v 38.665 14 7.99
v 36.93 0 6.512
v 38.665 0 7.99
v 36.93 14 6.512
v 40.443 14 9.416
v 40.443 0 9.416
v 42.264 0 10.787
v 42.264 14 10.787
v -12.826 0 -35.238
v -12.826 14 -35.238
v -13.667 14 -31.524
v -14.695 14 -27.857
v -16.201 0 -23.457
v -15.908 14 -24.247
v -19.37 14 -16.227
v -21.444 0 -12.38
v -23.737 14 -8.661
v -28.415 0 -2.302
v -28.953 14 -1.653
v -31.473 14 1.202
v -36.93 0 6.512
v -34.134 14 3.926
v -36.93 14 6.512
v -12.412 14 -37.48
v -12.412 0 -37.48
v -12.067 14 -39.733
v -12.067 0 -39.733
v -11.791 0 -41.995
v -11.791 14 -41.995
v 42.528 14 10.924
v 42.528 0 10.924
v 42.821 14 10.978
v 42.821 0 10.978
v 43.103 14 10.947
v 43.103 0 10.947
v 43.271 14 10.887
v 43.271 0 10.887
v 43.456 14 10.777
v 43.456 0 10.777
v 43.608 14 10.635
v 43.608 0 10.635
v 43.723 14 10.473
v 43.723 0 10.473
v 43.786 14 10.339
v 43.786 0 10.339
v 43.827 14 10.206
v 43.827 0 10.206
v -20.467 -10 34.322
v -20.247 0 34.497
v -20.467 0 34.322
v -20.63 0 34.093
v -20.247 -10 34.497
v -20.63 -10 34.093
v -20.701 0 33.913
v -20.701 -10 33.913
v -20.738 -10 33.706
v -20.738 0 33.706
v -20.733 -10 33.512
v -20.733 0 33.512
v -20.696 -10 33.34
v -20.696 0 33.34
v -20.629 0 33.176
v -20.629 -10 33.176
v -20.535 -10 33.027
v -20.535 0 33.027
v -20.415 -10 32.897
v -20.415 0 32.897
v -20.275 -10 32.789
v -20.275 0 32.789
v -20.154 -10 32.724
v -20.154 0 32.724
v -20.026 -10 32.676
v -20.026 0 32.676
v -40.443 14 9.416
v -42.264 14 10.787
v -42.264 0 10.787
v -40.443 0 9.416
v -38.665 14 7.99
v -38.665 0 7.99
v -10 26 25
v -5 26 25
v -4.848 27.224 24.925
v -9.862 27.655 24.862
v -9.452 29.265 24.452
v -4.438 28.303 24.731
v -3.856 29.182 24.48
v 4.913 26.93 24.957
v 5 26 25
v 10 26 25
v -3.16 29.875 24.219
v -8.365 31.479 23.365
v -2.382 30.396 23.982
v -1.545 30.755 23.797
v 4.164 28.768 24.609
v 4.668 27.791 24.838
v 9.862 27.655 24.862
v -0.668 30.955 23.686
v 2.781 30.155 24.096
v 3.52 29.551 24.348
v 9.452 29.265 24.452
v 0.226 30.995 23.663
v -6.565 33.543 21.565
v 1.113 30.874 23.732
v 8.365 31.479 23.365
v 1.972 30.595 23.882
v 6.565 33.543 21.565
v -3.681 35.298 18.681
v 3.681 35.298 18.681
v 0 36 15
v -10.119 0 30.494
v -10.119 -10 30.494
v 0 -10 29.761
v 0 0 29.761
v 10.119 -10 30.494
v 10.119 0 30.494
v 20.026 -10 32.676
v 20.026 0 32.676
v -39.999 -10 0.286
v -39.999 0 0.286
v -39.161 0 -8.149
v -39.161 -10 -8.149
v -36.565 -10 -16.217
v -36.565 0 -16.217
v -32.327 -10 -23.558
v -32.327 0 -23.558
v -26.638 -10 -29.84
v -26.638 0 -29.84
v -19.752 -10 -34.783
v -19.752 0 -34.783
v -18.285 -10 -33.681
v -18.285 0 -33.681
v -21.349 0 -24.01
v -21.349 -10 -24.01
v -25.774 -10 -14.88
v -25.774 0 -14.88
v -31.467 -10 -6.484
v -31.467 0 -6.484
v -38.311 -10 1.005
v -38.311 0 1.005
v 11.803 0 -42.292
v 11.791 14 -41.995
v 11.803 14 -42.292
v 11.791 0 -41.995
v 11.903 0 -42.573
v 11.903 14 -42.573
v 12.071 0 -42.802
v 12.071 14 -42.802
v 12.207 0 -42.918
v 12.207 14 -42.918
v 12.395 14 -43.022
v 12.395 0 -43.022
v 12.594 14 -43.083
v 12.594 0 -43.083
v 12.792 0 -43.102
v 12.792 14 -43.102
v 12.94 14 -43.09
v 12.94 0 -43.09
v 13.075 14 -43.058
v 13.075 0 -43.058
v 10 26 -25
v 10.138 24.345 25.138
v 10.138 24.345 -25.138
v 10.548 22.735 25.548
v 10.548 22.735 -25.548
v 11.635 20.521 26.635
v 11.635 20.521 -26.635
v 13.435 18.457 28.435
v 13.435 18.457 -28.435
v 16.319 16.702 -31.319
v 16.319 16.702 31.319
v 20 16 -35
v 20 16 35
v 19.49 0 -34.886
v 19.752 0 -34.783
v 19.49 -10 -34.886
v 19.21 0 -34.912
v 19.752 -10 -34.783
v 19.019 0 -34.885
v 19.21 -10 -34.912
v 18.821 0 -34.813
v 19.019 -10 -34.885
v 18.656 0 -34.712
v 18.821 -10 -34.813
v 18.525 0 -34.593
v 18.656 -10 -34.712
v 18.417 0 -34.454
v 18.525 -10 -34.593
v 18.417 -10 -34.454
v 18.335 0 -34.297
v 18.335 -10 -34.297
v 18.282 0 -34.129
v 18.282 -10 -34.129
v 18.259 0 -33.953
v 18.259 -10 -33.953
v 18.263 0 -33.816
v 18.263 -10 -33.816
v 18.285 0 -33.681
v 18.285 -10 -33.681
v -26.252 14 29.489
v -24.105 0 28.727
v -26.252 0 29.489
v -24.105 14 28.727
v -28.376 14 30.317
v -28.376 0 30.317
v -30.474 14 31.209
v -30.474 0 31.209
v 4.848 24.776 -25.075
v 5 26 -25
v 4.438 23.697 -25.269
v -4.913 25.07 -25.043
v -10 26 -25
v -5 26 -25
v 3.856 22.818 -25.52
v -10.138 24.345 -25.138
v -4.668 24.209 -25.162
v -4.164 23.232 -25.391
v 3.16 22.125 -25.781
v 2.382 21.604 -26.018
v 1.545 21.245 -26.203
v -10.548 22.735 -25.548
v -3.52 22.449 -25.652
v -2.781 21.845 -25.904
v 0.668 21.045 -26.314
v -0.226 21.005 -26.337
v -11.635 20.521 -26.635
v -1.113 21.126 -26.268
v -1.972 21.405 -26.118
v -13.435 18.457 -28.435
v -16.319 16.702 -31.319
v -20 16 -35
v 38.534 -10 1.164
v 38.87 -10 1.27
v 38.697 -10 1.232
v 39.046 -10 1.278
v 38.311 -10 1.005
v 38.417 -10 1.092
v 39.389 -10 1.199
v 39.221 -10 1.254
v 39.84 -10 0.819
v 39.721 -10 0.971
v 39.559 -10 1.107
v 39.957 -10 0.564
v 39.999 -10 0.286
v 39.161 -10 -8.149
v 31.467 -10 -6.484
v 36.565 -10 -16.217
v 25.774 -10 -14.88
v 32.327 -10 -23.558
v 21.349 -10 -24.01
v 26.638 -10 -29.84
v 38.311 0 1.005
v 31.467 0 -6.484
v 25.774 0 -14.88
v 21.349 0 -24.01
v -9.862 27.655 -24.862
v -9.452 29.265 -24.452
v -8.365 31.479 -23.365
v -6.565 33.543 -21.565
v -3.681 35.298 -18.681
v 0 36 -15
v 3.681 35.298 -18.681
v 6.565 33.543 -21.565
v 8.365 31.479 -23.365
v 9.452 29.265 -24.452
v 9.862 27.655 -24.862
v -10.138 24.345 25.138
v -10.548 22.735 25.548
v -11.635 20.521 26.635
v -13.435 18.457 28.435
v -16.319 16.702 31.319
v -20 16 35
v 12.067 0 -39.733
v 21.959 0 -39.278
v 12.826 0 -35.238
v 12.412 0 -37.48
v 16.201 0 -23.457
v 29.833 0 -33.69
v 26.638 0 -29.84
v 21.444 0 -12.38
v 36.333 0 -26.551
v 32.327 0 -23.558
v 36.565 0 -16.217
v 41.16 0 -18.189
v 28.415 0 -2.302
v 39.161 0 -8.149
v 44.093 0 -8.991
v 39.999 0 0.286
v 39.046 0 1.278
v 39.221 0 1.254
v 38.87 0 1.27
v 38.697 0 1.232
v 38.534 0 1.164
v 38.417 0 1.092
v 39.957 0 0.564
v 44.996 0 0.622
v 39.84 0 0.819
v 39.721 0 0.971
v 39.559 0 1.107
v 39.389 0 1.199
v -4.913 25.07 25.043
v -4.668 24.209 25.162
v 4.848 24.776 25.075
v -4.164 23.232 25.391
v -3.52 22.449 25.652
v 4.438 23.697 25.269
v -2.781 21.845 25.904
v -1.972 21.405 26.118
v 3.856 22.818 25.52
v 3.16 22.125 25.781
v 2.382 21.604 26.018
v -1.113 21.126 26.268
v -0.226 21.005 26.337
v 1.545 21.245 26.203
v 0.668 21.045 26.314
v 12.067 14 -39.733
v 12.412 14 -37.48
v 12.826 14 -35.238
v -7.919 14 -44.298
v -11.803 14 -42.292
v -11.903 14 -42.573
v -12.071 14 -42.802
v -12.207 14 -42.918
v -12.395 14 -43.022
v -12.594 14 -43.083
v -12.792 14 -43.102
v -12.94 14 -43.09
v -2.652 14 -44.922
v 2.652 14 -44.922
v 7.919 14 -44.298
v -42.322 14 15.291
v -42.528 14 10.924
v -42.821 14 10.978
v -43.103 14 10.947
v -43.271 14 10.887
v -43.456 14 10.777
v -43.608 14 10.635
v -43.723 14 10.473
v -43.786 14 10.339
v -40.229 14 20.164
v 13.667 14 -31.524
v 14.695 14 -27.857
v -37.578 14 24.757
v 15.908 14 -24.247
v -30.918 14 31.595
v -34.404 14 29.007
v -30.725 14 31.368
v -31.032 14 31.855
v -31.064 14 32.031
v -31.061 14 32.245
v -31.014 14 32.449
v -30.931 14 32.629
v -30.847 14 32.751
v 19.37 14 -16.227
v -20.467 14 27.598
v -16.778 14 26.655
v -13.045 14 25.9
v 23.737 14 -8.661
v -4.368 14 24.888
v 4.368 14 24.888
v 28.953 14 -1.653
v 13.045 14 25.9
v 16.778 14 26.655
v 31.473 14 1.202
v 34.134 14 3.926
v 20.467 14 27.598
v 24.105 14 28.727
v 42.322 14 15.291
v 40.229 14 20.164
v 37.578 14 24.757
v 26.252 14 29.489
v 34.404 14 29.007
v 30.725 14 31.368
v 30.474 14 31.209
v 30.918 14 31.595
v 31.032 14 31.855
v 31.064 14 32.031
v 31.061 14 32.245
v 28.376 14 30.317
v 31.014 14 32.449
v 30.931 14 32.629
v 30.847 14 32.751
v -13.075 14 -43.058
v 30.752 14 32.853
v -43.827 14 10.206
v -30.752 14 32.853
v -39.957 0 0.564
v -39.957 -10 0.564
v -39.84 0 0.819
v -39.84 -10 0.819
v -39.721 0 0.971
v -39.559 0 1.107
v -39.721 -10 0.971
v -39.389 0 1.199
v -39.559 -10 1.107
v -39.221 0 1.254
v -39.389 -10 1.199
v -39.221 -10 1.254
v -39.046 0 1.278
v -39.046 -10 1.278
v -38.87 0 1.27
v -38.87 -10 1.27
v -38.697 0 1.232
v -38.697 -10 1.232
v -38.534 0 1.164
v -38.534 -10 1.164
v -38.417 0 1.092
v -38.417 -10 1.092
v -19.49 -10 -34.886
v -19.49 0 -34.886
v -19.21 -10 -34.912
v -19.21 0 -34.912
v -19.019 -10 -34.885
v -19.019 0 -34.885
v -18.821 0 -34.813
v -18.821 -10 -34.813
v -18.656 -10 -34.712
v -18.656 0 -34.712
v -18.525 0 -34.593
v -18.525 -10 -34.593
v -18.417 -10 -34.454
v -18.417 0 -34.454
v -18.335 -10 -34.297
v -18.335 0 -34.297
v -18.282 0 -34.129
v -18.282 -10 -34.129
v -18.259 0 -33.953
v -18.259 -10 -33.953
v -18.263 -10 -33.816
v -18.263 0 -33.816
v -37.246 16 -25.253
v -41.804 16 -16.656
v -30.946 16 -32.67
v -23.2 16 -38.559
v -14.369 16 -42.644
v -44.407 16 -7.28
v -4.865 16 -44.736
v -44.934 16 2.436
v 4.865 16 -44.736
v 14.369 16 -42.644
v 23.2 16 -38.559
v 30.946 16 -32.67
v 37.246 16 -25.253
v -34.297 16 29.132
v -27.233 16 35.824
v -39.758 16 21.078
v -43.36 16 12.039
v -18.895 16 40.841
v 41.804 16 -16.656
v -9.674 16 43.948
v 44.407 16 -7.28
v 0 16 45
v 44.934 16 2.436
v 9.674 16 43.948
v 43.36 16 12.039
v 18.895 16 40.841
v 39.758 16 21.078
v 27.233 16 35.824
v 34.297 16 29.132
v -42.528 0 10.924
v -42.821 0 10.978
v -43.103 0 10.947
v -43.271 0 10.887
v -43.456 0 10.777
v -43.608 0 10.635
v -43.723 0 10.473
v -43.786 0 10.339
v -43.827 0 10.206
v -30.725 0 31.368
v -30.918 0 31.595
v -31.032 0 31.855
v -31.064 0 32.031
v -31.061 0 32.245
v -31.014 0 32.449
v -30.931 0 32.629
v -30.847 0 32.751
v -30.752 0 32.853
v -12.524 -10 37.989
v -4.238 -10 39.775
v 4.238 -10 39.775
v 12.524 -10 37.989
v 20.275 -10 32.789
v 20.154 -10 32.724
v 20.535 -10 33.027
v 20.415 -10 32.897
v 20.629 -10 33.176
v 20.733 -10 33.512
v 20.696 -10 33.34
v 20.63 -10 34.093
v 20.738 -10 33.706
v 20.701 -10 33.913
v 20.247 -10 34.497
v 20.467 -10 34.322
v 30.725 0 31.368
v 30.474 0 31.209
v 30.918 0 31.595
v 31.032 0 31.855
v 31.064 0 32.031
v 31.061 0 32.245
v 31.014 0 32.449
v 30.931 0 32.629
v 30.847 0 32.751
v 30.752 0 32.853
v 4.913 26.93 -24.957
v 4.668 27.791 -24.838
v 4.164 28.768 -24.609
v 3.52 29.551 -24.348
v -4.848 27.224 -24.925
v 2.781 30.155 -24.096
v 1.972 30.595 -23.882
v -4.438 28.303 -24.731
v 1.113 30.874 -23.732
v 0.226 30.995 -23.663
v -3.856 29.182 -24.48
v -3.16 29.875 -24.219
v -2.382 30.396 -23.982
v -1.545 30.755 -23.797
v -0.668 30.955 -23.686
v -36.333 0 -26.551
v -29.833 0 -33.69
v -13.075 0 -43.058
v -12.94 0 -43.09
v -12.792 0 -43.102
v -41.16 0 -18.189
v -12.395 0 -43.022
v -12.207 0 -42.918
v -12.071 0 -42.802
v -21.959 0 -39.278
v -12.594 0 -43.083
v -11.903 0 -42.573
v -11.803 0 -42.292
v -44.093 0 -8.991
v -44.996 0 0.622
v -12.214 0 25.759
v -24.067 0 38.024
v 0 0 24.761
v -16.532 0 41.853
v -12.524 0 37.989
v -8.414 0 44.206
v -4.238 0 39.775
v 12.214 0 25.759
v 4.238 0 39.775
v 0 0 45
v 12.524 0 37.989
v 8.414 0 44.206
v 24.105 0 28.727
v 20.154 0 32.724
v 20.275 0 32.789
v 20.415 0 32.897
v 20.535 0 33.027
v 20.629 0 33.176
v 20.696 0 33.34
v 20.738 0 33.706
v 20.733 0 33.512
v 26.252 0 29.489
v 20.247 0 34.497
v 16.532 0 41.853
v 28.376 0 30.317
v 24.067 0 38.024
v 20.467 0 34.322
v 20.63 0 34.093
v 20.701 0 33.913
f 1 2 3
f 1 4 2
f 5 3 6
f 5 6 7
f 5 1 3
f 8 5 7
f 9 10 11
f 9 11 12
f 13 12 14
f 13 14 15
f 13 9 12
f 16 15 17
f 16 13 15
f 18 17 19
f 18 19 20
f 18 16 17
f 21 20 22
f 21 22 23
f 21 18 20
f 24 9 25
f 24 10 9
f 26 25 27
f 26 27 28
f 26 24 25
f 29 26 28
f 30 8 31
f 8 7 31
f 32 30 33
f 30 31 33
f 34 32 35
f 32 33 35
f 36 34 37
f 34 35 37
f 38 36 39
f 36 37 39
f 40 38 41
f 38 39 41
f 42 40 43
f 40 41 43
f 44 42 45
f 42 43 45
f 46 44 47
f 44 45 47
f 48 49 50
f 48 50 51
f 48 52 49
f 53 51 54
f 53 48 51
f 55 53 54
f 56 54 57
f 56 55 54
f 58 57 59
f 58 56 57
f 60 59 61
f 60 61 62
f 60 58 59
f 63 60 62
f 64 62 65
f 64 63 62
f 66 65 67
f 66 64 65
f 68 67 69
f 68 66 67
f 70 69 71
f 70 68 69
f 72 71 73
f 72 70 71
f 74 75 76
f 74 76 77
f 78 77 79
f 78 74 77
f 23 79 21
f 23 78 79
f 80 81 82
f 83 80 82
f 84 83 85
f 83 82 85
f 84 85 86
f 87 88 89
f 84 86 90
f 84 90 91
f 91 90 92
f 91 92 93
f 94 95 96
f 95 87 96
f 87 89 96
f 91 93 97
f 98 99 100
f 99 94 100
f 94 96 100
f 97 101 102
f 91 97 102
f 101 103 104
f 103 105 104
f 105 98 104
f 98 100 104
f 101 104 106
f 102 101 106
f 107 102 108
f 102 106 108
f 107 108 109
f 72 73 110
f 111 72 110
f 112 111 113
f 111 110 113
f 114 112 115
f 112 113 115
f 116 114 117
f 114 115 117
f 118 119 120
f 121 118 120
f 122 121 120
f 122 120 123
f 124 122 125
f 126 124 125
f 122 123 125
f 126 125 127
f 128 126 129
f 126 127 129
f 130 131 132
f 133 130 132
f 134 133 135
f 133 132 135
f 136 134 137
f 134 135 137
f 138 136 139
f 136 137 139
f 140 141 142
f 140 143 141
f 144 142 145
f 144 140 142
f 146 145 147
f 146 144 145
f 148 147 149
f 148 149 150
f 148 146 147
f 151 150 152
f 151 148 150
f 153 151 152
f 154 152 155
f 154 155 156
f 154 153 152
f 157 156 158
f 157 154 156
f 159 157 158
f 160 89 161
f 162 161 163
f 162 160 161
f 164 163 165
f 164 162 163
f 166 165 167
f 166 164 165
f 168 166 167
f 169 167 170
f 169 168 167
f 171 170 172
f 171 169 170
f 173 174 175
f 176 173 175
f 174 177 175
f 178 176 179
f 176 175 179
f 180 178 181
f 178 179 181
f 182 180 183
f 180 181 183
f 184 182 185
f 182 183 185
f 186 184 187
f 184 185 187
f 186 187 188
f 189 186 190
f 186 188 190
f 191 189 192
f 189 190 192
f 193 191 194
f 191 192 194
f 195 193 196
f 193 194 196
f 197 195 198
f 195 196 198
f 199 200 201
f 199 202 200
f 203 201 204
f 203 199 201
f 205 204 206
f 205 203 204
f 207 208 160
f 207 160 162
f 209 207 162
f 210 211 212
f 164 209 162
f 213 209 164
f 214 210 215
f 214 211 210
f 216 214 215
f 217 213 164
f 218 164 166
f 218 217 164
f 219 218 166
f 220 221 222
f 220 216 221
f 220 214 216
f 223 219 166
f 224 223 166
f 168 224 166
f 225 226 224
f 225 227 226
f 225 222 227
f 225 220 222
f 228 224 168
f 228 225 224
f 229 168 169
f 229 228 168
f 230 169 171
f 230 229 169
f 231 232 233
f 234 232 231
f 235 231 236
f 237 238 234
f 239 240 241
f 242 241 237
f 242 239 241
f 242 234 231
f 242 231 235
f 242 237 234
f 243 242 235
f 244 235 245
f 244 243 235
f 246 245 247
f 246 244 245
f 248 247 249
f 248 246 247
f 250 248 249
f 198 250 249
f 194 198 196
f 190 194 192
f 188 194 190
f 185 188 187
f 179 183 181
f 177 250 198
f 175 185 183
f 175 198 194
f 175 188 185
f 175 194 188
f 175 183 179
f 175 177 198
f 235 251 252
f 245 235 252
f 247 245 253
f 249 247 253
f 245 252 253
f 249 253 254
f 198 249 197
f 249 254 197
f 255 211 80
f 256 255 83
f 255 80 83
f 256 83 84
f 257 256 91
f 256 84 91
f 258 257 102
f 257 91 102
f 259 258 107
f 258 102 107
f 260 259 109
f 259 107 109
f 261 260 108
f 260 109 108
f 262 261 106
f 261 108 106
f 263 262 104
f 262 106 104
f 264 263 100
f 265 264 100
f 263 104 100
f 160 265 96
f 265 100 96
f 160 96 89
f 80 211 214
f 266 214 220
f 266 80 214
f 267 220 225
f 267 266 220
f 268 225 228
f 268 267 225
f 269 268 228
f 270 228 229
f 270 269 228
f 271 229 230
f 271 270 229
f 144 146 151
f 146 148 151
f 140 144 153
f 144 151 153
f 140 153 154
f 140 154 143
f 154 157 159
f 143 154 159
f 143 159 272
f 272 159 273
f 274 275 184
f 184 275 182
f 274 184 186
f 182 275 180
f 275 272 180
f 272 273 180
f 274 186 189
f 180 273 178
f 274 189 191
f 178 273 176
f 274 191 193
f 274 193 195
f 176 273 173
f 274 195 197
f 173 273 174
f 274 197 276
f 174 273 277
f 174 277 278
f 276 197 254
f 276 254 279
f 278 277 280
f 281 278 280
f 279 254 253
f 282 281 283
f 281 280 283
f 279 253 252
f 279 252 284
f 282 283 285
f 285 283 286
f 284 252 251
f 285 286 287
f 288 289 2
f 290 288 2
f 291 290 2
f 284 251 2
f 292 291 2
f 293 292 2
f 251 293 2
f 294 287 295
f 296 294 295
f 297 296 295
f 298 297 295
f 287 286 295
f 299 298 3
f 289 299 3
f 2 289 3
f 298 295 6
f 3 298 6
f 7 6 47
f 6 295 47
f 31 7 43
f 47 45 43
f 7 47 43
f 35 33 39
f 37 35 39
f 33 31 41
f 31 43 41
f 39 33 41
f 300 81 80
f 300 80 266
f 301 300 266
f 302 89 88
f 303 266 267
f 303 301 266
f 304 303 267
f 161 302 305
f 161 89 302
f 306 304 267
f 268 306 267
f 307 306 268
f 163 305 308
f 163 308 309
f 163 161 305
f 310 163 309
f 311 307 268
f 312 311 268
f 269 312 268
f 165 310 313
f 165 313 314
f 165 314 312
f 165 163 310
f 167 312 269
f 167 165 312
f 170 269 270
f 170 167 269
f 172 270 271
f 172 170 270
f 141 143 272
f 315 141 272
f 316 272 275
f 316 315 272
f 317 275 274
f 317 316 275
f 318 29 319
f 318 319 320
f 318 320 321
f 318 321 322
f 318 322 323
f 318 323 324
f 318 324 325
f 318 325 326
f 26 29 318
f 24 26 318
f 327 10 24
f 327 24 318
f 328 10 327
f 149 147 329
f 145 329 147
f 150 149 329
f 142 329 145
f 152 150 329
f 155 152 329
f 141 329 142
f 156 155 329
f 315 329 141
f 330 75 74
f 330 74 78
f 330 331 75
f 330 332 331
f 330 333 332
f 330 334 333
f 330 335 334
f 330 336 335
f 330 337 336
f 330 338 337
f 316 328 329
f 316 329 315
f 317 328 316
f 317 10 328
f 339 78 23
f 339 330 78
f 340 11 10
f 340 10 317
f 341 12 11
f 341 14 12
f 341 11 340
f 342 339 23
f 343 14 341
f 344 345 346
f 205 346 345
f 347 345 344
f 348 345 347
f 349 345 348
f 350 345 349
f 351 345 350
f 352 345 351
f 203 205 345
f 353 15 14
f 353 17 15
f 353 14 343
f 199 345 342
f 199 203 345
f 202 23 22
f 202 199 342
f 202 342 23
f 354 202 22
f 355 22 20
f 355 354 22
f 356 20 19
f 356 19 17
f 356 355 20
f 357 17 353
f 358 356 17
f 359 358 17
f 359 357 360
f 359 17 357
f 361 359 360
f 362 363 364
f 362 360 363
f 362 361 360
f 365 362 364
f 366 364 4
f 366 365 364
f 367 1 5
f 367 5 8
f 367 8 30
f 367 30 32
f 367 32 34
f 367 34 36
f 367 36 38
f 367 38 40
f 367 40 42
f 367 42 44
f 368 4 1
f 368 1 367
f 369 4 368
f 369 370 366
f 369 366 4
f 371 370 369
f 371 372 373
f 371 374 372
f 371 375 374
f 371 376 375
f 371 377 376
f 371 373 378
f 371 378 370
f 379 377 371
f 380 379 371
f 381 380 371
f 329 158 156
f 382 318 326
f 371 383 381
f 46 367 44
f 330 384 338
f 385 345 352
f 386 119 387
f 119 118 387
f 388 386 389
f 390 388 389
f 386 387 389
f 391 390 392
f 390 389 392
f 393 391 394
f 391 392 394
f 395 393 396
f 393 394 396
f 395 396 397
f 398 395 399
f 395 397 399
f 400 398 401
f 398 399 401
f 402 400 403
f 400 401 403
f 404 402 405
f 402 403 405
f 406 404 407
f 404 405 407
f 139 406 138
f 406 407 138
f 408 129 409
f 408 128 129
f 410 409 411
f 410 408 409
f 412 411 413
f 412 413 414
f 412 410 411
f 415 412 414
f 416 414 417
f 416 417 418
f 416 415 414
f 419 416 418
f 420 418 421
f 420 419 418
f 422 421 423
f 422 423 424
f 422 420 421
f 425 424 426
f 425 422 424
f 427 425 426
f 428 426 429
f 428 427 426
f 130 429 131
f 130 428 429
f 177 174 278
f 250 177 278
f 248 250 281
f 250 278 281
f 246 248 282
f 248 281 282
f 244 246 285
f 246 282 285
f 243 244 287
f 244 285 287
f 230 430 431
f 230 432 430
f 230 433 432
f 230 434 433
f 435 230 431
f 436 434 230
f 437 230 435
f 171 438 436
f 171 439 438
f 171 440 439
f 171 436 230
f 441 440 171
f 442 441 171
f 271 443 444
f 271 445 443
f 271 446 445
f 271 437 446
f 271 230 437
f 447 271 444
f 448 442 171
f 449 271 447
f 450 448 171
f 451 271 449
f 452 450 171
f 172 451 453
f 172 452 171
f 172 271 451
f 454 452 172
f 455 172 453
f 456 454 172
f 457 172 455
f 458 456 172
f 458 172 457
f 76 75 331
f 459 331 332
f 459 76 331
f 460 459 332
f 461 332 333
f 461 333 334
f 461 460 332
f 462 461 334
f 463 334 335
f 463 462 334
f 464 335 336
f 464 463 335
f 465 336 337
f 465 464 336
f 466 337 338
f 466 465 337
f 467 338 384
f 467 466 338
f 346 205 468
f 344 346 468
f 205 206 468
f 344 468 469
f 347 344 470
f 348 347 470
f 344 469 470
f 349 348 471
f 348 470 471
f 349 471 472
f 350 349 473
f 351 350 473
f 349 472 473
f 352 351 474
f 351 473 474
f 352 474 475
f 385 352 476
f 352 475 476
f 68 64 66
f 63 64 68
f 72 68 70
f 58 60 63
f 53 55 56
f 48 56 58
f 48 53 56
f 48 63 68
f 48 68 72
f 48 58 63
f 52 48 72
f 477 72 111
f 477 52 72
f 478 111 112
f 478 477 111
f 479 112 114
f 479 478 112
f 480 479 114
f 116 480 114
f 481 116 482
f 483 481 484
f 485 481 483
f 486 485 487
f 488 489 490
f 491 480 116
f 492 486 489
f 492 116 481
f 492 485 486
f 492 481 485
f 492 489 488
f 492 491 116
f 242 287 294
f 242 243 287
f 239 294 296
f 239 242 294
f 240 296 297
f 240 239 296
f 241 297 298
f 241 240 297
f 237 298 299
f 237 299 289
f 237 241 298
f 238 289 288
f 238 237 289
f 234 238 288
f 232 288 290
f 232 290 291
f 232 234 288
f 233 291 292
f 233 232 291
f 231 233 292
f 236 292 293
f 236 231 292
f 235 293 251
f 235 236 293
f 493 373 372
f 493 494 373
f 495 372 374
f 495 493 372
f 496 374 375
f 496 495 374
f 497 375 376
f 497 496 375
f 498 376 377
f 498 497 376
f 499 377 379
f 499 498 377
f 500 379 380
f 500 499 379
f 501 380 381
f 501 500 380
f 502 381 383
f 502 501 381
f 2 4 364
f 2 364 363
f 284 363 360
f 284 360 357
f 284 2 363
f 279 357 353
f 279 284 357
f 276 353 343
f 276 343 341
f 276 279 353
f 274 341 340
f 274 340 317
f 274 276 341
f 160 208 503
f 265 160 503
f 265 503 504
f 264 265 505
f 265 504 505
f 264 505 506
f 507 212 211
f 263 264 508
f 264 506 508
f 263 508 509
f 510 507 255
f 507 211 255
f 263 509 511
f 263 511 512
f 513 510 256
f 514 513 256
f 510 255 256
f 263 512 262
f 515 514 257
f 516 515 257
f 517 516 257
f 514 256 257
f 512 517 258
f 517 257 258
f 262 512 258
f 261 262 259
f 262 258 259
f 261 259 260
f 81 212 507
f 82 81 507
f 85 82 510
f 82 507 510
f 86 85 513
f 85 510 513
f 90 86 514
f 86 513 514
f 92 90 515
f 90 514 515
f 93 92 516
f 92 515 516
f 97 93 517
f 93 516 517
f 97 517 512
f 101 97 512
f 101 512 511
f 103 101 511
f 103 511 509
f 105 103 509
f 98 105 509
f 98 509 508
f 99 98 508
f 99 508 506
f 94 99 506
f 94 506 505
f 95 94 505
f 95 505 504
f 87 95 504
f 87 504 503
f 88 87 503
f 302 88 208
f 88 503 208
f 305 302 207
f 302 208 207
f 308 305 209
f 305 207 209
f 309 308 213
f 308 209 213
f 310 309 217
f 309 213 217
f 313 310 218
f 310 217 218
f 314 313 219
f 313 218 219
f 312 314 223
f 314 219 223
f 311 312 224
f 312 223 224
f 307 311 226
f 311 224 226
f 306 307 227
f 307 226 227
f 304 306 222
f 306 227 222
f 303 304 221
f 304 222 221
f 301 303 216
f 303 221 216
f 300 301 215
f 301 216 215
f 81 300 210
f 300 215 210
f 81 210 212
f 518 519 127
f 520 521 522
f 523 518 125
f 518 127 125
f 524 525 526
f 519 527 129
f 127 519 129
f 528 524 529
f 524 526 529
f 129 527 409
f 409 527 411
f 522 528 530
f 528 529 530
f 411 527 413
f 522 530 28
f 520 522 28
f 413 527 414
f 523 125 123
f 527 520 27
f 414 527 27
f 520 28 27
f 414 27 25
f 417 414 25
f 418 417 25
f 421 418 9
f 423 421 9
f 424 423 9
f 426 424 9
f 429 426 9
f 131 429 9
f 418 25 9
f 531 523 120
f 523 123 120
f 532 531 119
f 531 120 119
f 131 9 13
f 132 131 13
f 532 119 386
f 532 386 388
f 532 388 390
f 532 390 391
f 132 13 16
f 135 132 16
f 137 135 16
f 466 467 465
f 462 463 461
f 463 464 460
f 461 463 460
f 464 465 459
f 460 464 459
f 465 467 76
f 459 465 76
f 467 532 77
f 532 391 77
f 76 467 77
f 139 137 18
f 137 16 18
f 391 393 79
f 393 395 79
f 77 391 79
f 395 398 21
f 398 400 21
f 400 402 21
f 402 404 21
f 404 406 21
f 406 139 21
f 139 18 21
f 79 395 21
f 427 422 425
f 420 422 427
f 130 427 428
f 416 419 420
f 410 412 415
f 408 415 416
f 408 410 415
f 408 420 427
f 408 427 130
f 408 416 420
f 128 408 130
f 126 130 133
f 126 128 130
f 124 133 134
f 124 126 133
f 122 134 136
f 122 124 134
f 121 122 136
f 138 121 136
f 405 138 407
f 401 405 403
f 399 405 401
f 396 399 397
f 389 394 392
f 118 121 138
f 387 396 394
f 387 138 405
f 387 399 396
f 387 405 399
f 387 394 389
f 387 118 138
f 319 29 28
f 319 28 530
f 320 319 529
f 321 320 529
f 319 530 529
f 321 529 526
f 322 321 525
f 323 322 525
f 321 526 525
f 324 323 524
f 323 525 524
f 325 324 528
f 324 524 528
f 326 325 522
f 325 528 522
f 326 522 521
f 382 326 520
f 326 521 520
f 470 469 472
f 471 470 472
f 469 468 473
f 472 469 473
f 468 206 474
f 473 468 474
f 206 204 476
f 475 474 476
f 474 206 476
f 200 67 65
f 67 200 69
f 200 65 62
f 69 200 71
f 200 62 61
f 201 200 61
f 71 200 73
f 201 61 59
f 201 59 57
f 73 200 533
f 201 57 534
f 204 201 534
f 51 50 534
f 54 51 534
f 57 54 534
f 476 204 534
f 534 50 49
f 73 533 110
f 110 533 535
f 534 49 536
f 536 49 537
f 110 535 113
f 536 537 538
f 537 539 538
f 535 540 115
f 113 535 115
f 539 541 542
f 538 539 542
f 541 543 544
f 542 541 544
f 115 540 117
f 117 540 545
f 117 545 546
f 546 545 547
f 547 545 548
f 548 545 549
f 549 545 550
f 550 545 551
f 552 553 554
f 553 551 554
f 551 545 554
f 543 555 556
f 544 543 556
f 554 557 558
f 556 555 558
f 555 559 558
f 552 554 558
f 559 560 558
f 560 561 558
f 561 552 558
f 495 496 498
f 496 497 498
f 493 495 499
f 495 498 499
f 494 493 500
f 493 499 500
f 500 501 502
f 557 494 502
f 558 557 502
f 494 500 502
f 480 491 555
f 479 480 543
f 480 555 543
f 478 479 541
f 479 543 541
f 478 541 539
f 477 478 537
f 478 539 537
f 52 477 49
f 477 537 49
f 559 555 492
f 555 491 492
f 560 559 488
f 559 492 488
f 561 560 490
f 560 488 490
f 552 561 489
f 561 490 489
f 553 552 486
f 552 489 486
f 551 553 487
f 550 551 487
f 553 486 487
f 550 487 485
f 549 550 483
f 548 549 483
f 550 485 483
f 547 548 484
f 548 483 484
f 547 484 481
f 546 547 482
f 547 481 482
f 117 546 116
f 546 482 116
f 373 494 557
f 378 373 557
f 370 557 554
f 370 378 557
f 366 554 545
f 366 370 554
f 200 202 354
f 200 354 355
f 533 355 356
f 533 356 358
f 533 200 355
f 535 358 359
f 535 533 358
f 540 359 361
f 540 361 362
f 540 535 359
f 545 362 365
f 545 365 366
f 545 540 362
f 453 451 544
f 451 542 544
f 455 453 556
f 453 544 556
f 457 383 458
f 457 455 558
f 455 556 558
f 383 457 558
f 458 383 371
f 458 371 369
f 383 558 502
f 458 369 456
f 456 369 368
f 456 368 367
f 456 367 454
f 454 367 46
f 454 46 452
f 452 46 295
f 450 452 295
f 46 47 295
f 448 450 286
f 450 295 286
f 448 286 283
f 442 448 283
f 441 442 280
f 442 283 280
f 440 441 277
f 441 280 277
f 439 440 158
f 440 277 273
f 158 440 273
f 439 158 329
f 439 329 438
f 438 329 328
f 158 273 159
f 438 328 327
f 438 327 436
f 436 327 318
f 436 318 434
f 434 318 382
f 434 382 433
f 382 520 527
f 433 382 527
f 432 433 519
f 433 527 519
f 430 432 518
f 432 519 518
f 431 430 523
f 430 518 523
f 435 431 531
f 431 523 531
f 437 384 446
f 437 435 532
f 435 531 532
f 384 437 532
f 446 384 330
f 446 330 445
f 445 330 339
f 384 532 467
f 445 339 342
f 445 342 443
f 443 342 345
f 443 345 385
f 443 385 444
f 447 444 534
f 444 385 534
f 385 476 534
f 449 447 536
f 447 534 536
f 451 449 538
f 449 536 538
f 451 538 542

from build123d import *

# Parameters (mm, degrees)
SKETCH1_R                = 37.5
BOSS_EXTRUDE1_DEPTH      = 14
CUT_EXTRUDE2_START       = -14
CUT_EXTRUDE2_DEPTH       = 14
SKETCH4_R                = 45
SKETCH4_R_2              = 37.5
BOSS_EXTRUDE2_DEPTH      = 14
SKETCH6_R                = 45
BOSS_EXTRUDE3_DEPTH      = 2
SKETCH7_R                = 1.75
CUT_EXTRUDE3_DEPTH       = 66.620118866
CIRPATTERN2_COUNT        = 3
BOSS_EXTRUDE4_DEPTH      = 10
FILLET1_R                = 1
CIRPATTERN3_COUNT        = 3
FILLET1_OF_CIRPATTERN3_R = 1
CUT_EXTRUDE4_DEPTH       = 69.01470446
FILLET2_R                = 1
SKETCH15_R               = 45
BOSS_EXTRUDE5_DEPTH      = 2
SKETCH16_W               = 20
SKETCH16_H               = 50
BOSS_EXTRUDE6_DEPTH      = 20
SKETCH17_R               = 5
CUT_EXTRUDE5_DEPTH       = 91.669730467
FILLET3_R                = 10


# Read off the part's stored shape, not the designer's step: Cut-Extrude2
with BuildPart() as part:
    # Sketch1 → Boss-Extrude1 (new body)
    with BuildSketch(Plane(origin=(0, 0, 0), x_dir=(1, 0, 0), z_dir=(0, 1, 0))):
        with Locations(Location((0, 0, 0), (0, 0, 270))):
            Circle(SKETCH1_R)
    extrude(amount=BOSS_EXTRUDE1_DEPTH)

    # Cut-Extrude2 outline → Cut-Extrude2 (cut)
    with BuildSketch(Plane(origin=(0, 14, 0), x_dir=(1, 0, 0), z_dir=(0, 1, 0)).offset(CUT_EXTRUDE2_START)):
        with BuildLine():
            ThreePointArc((-24.104535363, -28.726666617), (0, -24.760936498), (24.104535363, -28.726666617))
            ThreePointArc((24.104535363, -28.726666617), (32.475952642, -18.75), (36.930290738, -6.511806663))
            ThreePointArc((36.930290738, -6.511806663), (21.443600029, 12.380468249), (12.825755375, 35.238473279))
            ThreePointArc((12.825755375, 35.238473279), (0, 37.5), (-12.825755375, 35.238473279))
            ThreePointArc((-12.825755375, 35.238473279), (-21.443600029, 12.380468249), (-36.930290738, -6.511806663))
            ThreePointArc((-36.930290738, -6.511806663), (-32.475952642, -18.75), (-24.104535363, -28.726666617))
        make_face()
    extrude(amount=CUT_EXTRUDE2_DEPTH, mode=Mode.SUBTRACT)

    # Sketch4 → Boss-Extrude2 (add)
    with BuildSketch(Plane(origin=(0, 0, 0), x_dir=(1, 0, 0), z_dir=(0, 1, 0))):
        with Locations(Location((0, 0, 0), (0, 0, 270))):
            Circle(SKETCH4_R)
        Circle(SKETCH4_R_2, mode=Mode.SUBTRACT)
    extrude(amount=BOSS_EXTRUDE2_DEPTH)

    # Sketch6 → Boss-Extrude3 (add)
    with BuildSketch(Plane(origin=(0, 14, 0), x_dir=(1, 0, 0), z_dir=(0, 1, 0))):
        with Locations(Location((0, 0, 0), (0, 0, 270))):
            Circle(SKETCH6_R)
        with BuildLine():
            ThreePointArc((-28.952849653, 1.653026611), (-25.11473671, -14.5), (-13.044861788, -25.900416617))
            ThreePointArc((-13.044861788, -25.900416617), (0, -24.760936498), (13.044861788, -25.900416617))
            ThreePointArc((13.044861788, -25.900416617), (25.11473671, -14.5), (28.952849653, 1.653026611))
            ThreePointArc((28.952849653, 1.653026611), (21.443600029, 12.380468249), (15.907987865, 24.247390006))
            ThreePointArc((15.907987865, 24.247390006), (0, 29), (-15.907987865, 24.247390006))
            ThreePointArc((-15.907987865, 24.247390006), (-21.443600029, 12.380468249), (-28.952849653, 1.653026611))
        make_face(mode=Mode.SUBTRACT)
    extrude(amount=BOSS_EXTRUDE3_DEPTH)

    # Sketch7 → Cut-Extrude3 (cut, through all)
    with BuildSketch(Plane(origin=(0, 16, 0), x_dir=(1, 0, 0), z_dir=(0, 1, 0))):
        with Locations(Location((0, 32, 0), (0, 0, 270))):
            Circle(SKETCH7_R)
    cut_extrude3 = extrude(amount=-CUT_EXTRUDE3_DEPTH, mode=Mode.SUBTRACT)

    # CirPattern2: Cut-Extrude3 ×3 about axis
    cirpattern2_axis = Axis((0, 0, 0), (0, 1, 0))
    for i in range(1, CIRPATTERN2_COUNT):
        add(cut_extrude3.rotate(cirpattern2_axis, i * 360 / CIRPATTERN2_COUNT), mode=Mode.SUBTRACT)

    # Sketch13 → Boss-Extrude4 (add)
    with BuildSketch(Plane.XZ):
        with BuildLine():
            ThreePointArc((-22.11228446, 33.332369792), (0, 29.760936498), (22.11228446, 33.332369792))
            ThreePointArc((22.11228446, 33.332369792), (0, 40), (-22.11228446, 33.332369792))
        make_face()
    boss_extrude4 = extrude(amount=BOSS_EXTRUDE4_DEPTH)

    # Fillet1
    fillet1_edges = [part.edges().sort_by_distance(p)[0] for p in [
        (22.11228446, -5, 33.332369792),
        (-22.11228446, -5, 33.332369792),
    ]]
    fillet(fillet1_edges, radius=FILLET1_R)

    # CirPattern3: Boss-Extrude4 ×3 about axis
    cirpattern3_axis = Axis((0, 0, 0), (0, 1, 0))
    for i in range(1, CIRPATTERN3_COUNT):
        add(boss_extrude4.rotate(cirpattern3_axis, i * 360 / CIRPATTERN3_COUNT))

    # Fillet1 of CirPattern3
    fillet1_of_cirpattern3_edges = [part.edges().sort_by_distance(p)[0] for p in [
        (17.810536778, -5, -35.815984974),
        (39.922821238, -5, 2.483615182),
        (-39.922821238, -5, 2.483615182),
        (-17.810536778, -5, -35.815984974),
    ]]
    fillet(fillet1_of_cirpattern3_edges, radius=FILLET1_OF_CIRPATTERN3_R)

    # Sketch14 → Cut-Extrude4 (cut, through all)
    with BuildSketch(Plane.XZ.offset(-14)):
        with BuildLine():
            Line((-33.206244265, 32.485097805), (-44.736042076, 12.514902195))
            ThreePointArc((-44.736042076, 12.514902195), (-21.443600029, -12.380468249), (-11.529797811, -45))
            Line((-11.529797811, -45), (11.529797811, -45))
            ThreePointArc((11.529797811, -45), (21.443600029, -12.380468249), (44.736042076, 12.514902195))
            Line((44.736042076, 12.514902195), (33.206244265, 32.485097805))
            ThreePointArc((33.206244265, 32.485097805), (0, 24.760936498), (-33.206244265, 32.485097805))
        make_face()
    extrude(amount=CUT_EXTRUDE4_DEPTH, mode=Mode.SUBTRACT)

    # Fillet2
    fillet2_edges = [part.edges().sort_by_distance(p)[0] for p in [
        (43.466885988, 7, 11.646021745),
        (11.64769231, 7, -43.466438362),
        (-31.819193678, 7, 31.820416617),
        (31.819193678, 7, 31.820416617),
        (-11.64769231, 7, -43.466438362),
        (-43.466885988, 7, 11.646021745),
    ]]
    fillet(fillet2_edges, radius=FILLET2_R)

    # Sketch15 → Boss-Extrude5 (add)
    with BuildSketch(Plane.XZ.offset(-14)):
        with Locations(Location((0, 0, 0), (0, 0, 253.108257002))):
            Circle(SKETCH15_R)
    extrude(amount=-BOSS_EXTRUDE5_DEPTH)

    # Sketch16 → Boss-Extrude6 (add)
    with BuildSketch(Plane(origin=(0, 16, 0), x_dir=(1, 0, 0), z_dir=(0, 1, 0))):
        Rectangle(SKETCH16_W, SKETCH16_H)
    extrude(amount=BOSS_EXTRUDE6_DEPTH)

    # Sketch17 → Cut-Extrude5 (cut, through all)
    with BuildSketch(Plane(origin=(0, 0, -25), x_dir=(-1, 0, 0), z_dir=(0, 0, -1))):
        with Locations((0, 26)):
            Circle(SKETCH17_R)
    extrude(amount=-CUT_EXTRUDE5_DEPTH, mode=Mode.SUBTRACT)

    # Fillet3
    # the kernel refuses this fillet: 10 mm, written as the material it adds along each edge
    with BuildSketch(Plane(origin=(-10, 16, -25), x_dir=(0, 0, -1), z_dir=(1, 0, 0))) as fillet3_piece_1_section:
        with BuildLine():
            CenterArc((FILLET3_R, FILLET3_R), FILLET3_R, 180, 90)
            Line((0, FILLET3_R), (0, 0))
            Line((0, 0), (FILLET3_R, 0))
        make_face()
    fillet3_piece_1 = extrude(amount=20, mode=Mode.PRIVATE)
    fillet3_piece_1 = fillet3_piece_1 - Plane(origin=(0, 26, -27.35205283), x_dir=(-1, 0, 0), z_dir=(0, 0, -1)) * Cylinder(5, 80, mode=Mode.PRIVATE)
    add(fillet3_piece_1)
    with BuildSketch(Plane(origin=(10, 16, 25), x_dir=(0, 0, 1), z_dir=(-1, 0, 0))) as fillet3_piece_2_section:
        with BuildLine():
            CenterArc((FILLET3_R, FILLET3_R), FILLET3_R, 180, 90)
            Line((0, FILLET3_R), (0, 0))
            Line((0, 0), (FILLET3_R, 0))
        make_face()
    fillet3_piece_2 = extrude(amount=20, mode=Mode.PRIVATE)
    fillet3_piece_2 = fillet3_piece_2 - Plane(origin=(0, 26, 27.35205283), x_dir=(-1, 0, 0), z_dir=(0, 0, -1)) * Cylinder(5, 80, mode=Mode.PRIVATE)
    add(fillet3_piece_2)
    with BuildSketch(Plane(origin=(10, 16, -25), x_dir=(1, 0, 0), z_dir=(0, 0, 1)), Plane(origin=(-10, 16, 25), x_dir=(-1, 0, 0), z_dir=(0, 0, -1))) as fillet3_piece_3:
        with BuildLine():
            CenterArc((FILLET3_R, FILLET3_R), FILLET3_R, 180, 90)
            Line((0, FILLET3_R), (0, 0))
            Line((0, 0), (FILLET3_R, 0))
        make_face()
    extrude(amount=50)
    with BuildSketch(Plane(origin=(-35, 16, -25), x_dir=(0, 0, -1), z_dir=(1, 0, 0))) as fillet3_piece_4a_section:
        with BuildLine():
            CenterArc((FILLET3_R, FILLET3_R), FILLET3_R, 180, 90)
            Line((0, FILLET3_R), (0, 0))
            Line((0, 0), (FILLET3_R, 0))
        make_face()
    fillet3_piece_4a = extrude(amount=45, mode=Mode.PRIVATE)
    fillet3_piece_4a = fillet3_piece_4a & Plane(origin=(0, 18.302066934, 0), x_dir=(0, 0, 1), z_dir=(0, -1, 0)) * Cylinder(45, 130, mode=Mode.PRIVATE)
    fillet3_piece_4a = split(fillet3_piece_4a, bisect_by=Plane(origin=(-10, 18.302066934, -27.180095081), z_dir=(-1, 0, 0)), keep=Keep.TOP, mode=Mode.PRIVATE)
    with BuildSketch(Plane(origin=(-10, 16, 25), x_dir=(-1, 0, 0), z_dir=(0, 0, -1))) as fillet3_piece_4b_section:
        with BuildLine():
            CenterArc((FILLET3_R, FILLET3_R), FILLET3_R, 180, 90)
            Line((0, FILLET3_R), (0, 0))
            Line((0, 0), (FILLET3_R, 0))
        make_face()
    fillet3_piece_4b = extrude(amount=75, mode=Mode.PRIVATE)
    fillet3_piece_4b = fillet3_piece_4b & Plane(origin=(0, 18.30933206, 0), x_dir=(0, 0, 1), z_dir=(0, -1, 0)) * Cylinder(45, 190, mode=Mode.PRIVATE)
    fillet3_piece_4b = split(fillet3_piece_4b, bisect_by=Plane(origin=(-12.183620905, 18.30933206, -25), z_dir=(0, 0, -1)), keep=Keep.TOP, mode=Mode.PRIVATE)
    fillet3_piece_4 = fillet3_piece_4a & fillet3_piece_4b
    add(fillet3_piece_4)
    with BuildSketch(Plane(origin=(10, 16, -50), x_dir=(1, 0, 0), z_dir=(0, 0, 1))) as fillet3_piece_5a_section:
        with BuildLine():
            CenterArc((FILLET3_R, FILLET3_R), FILLET3_R, 180, 90)
            Line((0, FILLET3_R), (0, 0))
            Line((0, 0), (FILLET3_R, 0))
        make_face()
    fillet3_piece_5a = extrude(amount=75, mode=Mode.PRIVATE)
    fillet3_piece_5a = fillet3_piece_5a & Plane(origin=(0, 18.309328242, 0), x_dir=(0, 0, 1), z_dir=(0, -1, 0)) * Cylinder(45, 190, mode=Mode.PRIVATE)
    fillet3_piece_5a = split(fillet3_piece_5a, bisect_by=Plane(origin=(12.1836193, 18.309328242, -25), z_dir=(0, 0, -1)), keep=Keep.TOP, mode=Mode.PRIVATE)
    with BuildSketch(Plane(origin=(-10, 16, -25), x_dir=(0, 0, -1), z_dir=(1, 0, 0))) as fillet3_piece_5b_section:
        with BuildLine():
            CenterArc((FILLET3_R, FILLET3_R), FILLET3_R, 180, 90)
            Line((0, FILLET3_R), (0, 0))
            Line((0, 0), (FILLET3_R, 0))
        make_face()
    fillet3_piece_5b = extrude(amount=45, mode=Mode.PRIVATE)
    fillet3_piece_5b = fillet3_piece_5b & Plane(origin=(0, 18.30206696, 0), x_dir=(0, 0, 1), z_dir=(0, -1, 0)) * Cylinder(45, 130, mode=Mode.PRIVATE)
    fillet3_piece_5b = split(fillet3_piece_5b, bisect_by=Plane(origin=(10, 18.30206696, -27.180094929), z_dir=(1, 0, 0)), keep=Keep.TOP, mode=Mode.PRIVATE)
    fillet3_piece_5 = fillet3_piece_5a & fillet3_piece_5b
    add(fillet3_piece_5)
    with BuildSketch(Plane(origin=(10, 16, -25), x_dir=(1, 0, 0), z_dir=(0, 0, 1))) as fillet3_piece_6a_section:
        with BuildLine():
            CenterArc((FILLET3_R, FILLET3_R), FILLET3_R, 180, 90)
            Line((0, FILLET3_R), (0, 0))
            Line((0, 0), (FILLET3_R, 0))
        make_face()
    fillet3_piece_6a = extrude(amount=75, mode=Mode.PRIVATE)
    fillet3_piece_6a = fillet3_piece_6a & Plane(origin=(0, 18.30933206, 0), x_dir=(0, 0, 1), z_dir=(0, -1, 0)) * Cylinder(45, 190, mode=Mode.PRIVATE)
    fillet3_piece_6a = split(fillet3_piece_6a, bisect_by=Plane(origin=(12.183620905, 18.30933206, 25), z_dir=(0, 0, 1)), keep=Keep.TOP, mode=Mode.PRIVATE)
    with BuildSketch(Plane(origin=(35, 16, 25), x_dir=(0, 0, 1), z_dir=(-1, 0, 0))) as fillet3_piece_6b_section:
        with BuildLine():
            CenterArc((FILLET3_R, FILLET3_R), FILLET3_R, 180, 90)
            Line((0, FILLET3_R), (0, 0))
            Line((0, 0), (FILLET3_R, 0))
        make_face()
    fillet3_piece_6b = extrude(amount=45, mode=Mode.PRIVATE)
    fillet3_piece_6b = fillet3_piece_6b & Plane(origin=(0, 18.302066934, 0), x_dir=(0, 0, 1), z_dir=(0, -1, 0)) * Cylinder(45, 130, mode=Mode.PRIVATE)
    fillet3_piece_6b = split(fillet3_piece_6b, bisect_by=Plane(origin=(10, 18.302066934, 27.180095081), z_dir=(1, 0, 0)), keep=Keep.TOP, mode=Mode.PRIVATE)
    fillet3_piece_6 = fillet3_piece_6a & fillet3_piece_6b
    add(fillet3_piece_6)
    with BuildSketch(Plane(origin=(-10, 16, 50), x_dir=(-1, 0, 0), z_dir=(0, 0, -1))) as fillet3_piece_7a_section:
        with BuildLine():
            CenterArc((FILLET3_R, FILLET3_R), FILLET3_R, 180, 90)
            Line((0, FILLET3_R), (0, 0))
            Line((0, 0), (FILLET3_R, 0))
        make_face()
    fillet3_piece_7a = extrude(amount=75, mode=Mode.PRIVATE)
    fillet3_piece_7a = fillet3_piece_7a & Plane(origin=(0, 18.309328242, 0), x_dir=(0, 0, 1), z_dir=(0, -1, 0)) * Cylinder(45, 190, mode=Mode.PRIVATE)
    fillet3_piece_7a = split(fillet3_piece_7a, bisect_by=Plane(origin=(-12.1836193, 18.309328242, 25), z_dir=(0, 0, 1)), keep=Keep.TOP, mode=Mode.PRIVATE)
    with BuildSketch(Plane(origin=(10, 16, 25), x_dir=(0, 0, 1), z_dir=(-1, 0, 0))) as fillet3_piece_7b_section:
        with BuildLine():
            CenterArc((FILLET3_R, FILLET3_R), FILLET3_R, 180, 90)
            Line((0, FILLET3_R), (0, 0))
            Line((0, 0), (FILLET3_R, 0))
        make_face()
    fillet3_piece_7b = extrude(amount=45, mode=Mode.PRIVATE)
    fillet3_piece_7b = fillet3_piece_7b & Plane(origin=(0, 18.302066961, 0), x_dir=(0, 0, 1), z_dir=(0, -1, 0)) * Cylinder(45, 130, mode=Mode.PRIVATE)
    fillet3_piece_7b = split(fillet3_piece_7b, bisect_by=Plane(origin=(-10, 18.302066961, 27.180094929), z_dir=(-1, 0, 0)), keep=Keep.TOP, mode=Mode.PRIVATE)
    fillet3_piece_7 = fillet3_piece_7a & fillet3_piece_7b
    add(fillet3_piece_7)
    # the kernel refuses this fillet: 10 mm, written as the material it takes off along each edge
    with BuildSketch(Plane(origin=(-35, 36, -25), x_dir=(0, 0, 1), z_dir=(1, 0, 0))) as fillet3_2_piece_1:
        with BuildLine():
            CenterArc((FILLET3_R, FILLET3_R), FILLET3_R, 180, 90)
            Line((0, FILLET3_R), (0, 0))
            Line((0, 0), (FILLET3_R, 0))
        make_face()
    extrude(amount=70, mode=Mode.SUBTRACT)
    with BuildSketch(Plane(origin=(35, 36, 25), x_dir=(0, -1, 0), z_dir=(-1, 0, 0))) as fillet3_2_piece_2:
        with BuildLine():
            CenterArc((FILLET3_R, -FILLET3_R), FILLET3_R, 90, 90)
            Line((0, -FILLET3_R), (0, 0))
            Line((0, 0), (FILLET3_R, 0))
        make_face()
    extrude(amount=70, mode=Mode.SUBTRACT)
    with BuildSketch(Plane(origin=(10, 36, -50), x_dir=(0, -1, 0), z_dir=(0, 0, 1)), Plane(origin=(-10, 36, 50), x_dir=(0, -1, 0), z_dir=(0, 0, -1))) as fillet3_2_piece_3:
        with BuildLine():
            CenterArc((FILLET3_R, -FILLET3_R), FILLET3_R, 90, 90)
            Line((0, -FILLET3_R), (0, 0))
            Line((0, 0), (FILLET3_R, 0))
        make_face()
    extrude(amount=100, mode=Mode.SUBTRACT)


solid = part.part
